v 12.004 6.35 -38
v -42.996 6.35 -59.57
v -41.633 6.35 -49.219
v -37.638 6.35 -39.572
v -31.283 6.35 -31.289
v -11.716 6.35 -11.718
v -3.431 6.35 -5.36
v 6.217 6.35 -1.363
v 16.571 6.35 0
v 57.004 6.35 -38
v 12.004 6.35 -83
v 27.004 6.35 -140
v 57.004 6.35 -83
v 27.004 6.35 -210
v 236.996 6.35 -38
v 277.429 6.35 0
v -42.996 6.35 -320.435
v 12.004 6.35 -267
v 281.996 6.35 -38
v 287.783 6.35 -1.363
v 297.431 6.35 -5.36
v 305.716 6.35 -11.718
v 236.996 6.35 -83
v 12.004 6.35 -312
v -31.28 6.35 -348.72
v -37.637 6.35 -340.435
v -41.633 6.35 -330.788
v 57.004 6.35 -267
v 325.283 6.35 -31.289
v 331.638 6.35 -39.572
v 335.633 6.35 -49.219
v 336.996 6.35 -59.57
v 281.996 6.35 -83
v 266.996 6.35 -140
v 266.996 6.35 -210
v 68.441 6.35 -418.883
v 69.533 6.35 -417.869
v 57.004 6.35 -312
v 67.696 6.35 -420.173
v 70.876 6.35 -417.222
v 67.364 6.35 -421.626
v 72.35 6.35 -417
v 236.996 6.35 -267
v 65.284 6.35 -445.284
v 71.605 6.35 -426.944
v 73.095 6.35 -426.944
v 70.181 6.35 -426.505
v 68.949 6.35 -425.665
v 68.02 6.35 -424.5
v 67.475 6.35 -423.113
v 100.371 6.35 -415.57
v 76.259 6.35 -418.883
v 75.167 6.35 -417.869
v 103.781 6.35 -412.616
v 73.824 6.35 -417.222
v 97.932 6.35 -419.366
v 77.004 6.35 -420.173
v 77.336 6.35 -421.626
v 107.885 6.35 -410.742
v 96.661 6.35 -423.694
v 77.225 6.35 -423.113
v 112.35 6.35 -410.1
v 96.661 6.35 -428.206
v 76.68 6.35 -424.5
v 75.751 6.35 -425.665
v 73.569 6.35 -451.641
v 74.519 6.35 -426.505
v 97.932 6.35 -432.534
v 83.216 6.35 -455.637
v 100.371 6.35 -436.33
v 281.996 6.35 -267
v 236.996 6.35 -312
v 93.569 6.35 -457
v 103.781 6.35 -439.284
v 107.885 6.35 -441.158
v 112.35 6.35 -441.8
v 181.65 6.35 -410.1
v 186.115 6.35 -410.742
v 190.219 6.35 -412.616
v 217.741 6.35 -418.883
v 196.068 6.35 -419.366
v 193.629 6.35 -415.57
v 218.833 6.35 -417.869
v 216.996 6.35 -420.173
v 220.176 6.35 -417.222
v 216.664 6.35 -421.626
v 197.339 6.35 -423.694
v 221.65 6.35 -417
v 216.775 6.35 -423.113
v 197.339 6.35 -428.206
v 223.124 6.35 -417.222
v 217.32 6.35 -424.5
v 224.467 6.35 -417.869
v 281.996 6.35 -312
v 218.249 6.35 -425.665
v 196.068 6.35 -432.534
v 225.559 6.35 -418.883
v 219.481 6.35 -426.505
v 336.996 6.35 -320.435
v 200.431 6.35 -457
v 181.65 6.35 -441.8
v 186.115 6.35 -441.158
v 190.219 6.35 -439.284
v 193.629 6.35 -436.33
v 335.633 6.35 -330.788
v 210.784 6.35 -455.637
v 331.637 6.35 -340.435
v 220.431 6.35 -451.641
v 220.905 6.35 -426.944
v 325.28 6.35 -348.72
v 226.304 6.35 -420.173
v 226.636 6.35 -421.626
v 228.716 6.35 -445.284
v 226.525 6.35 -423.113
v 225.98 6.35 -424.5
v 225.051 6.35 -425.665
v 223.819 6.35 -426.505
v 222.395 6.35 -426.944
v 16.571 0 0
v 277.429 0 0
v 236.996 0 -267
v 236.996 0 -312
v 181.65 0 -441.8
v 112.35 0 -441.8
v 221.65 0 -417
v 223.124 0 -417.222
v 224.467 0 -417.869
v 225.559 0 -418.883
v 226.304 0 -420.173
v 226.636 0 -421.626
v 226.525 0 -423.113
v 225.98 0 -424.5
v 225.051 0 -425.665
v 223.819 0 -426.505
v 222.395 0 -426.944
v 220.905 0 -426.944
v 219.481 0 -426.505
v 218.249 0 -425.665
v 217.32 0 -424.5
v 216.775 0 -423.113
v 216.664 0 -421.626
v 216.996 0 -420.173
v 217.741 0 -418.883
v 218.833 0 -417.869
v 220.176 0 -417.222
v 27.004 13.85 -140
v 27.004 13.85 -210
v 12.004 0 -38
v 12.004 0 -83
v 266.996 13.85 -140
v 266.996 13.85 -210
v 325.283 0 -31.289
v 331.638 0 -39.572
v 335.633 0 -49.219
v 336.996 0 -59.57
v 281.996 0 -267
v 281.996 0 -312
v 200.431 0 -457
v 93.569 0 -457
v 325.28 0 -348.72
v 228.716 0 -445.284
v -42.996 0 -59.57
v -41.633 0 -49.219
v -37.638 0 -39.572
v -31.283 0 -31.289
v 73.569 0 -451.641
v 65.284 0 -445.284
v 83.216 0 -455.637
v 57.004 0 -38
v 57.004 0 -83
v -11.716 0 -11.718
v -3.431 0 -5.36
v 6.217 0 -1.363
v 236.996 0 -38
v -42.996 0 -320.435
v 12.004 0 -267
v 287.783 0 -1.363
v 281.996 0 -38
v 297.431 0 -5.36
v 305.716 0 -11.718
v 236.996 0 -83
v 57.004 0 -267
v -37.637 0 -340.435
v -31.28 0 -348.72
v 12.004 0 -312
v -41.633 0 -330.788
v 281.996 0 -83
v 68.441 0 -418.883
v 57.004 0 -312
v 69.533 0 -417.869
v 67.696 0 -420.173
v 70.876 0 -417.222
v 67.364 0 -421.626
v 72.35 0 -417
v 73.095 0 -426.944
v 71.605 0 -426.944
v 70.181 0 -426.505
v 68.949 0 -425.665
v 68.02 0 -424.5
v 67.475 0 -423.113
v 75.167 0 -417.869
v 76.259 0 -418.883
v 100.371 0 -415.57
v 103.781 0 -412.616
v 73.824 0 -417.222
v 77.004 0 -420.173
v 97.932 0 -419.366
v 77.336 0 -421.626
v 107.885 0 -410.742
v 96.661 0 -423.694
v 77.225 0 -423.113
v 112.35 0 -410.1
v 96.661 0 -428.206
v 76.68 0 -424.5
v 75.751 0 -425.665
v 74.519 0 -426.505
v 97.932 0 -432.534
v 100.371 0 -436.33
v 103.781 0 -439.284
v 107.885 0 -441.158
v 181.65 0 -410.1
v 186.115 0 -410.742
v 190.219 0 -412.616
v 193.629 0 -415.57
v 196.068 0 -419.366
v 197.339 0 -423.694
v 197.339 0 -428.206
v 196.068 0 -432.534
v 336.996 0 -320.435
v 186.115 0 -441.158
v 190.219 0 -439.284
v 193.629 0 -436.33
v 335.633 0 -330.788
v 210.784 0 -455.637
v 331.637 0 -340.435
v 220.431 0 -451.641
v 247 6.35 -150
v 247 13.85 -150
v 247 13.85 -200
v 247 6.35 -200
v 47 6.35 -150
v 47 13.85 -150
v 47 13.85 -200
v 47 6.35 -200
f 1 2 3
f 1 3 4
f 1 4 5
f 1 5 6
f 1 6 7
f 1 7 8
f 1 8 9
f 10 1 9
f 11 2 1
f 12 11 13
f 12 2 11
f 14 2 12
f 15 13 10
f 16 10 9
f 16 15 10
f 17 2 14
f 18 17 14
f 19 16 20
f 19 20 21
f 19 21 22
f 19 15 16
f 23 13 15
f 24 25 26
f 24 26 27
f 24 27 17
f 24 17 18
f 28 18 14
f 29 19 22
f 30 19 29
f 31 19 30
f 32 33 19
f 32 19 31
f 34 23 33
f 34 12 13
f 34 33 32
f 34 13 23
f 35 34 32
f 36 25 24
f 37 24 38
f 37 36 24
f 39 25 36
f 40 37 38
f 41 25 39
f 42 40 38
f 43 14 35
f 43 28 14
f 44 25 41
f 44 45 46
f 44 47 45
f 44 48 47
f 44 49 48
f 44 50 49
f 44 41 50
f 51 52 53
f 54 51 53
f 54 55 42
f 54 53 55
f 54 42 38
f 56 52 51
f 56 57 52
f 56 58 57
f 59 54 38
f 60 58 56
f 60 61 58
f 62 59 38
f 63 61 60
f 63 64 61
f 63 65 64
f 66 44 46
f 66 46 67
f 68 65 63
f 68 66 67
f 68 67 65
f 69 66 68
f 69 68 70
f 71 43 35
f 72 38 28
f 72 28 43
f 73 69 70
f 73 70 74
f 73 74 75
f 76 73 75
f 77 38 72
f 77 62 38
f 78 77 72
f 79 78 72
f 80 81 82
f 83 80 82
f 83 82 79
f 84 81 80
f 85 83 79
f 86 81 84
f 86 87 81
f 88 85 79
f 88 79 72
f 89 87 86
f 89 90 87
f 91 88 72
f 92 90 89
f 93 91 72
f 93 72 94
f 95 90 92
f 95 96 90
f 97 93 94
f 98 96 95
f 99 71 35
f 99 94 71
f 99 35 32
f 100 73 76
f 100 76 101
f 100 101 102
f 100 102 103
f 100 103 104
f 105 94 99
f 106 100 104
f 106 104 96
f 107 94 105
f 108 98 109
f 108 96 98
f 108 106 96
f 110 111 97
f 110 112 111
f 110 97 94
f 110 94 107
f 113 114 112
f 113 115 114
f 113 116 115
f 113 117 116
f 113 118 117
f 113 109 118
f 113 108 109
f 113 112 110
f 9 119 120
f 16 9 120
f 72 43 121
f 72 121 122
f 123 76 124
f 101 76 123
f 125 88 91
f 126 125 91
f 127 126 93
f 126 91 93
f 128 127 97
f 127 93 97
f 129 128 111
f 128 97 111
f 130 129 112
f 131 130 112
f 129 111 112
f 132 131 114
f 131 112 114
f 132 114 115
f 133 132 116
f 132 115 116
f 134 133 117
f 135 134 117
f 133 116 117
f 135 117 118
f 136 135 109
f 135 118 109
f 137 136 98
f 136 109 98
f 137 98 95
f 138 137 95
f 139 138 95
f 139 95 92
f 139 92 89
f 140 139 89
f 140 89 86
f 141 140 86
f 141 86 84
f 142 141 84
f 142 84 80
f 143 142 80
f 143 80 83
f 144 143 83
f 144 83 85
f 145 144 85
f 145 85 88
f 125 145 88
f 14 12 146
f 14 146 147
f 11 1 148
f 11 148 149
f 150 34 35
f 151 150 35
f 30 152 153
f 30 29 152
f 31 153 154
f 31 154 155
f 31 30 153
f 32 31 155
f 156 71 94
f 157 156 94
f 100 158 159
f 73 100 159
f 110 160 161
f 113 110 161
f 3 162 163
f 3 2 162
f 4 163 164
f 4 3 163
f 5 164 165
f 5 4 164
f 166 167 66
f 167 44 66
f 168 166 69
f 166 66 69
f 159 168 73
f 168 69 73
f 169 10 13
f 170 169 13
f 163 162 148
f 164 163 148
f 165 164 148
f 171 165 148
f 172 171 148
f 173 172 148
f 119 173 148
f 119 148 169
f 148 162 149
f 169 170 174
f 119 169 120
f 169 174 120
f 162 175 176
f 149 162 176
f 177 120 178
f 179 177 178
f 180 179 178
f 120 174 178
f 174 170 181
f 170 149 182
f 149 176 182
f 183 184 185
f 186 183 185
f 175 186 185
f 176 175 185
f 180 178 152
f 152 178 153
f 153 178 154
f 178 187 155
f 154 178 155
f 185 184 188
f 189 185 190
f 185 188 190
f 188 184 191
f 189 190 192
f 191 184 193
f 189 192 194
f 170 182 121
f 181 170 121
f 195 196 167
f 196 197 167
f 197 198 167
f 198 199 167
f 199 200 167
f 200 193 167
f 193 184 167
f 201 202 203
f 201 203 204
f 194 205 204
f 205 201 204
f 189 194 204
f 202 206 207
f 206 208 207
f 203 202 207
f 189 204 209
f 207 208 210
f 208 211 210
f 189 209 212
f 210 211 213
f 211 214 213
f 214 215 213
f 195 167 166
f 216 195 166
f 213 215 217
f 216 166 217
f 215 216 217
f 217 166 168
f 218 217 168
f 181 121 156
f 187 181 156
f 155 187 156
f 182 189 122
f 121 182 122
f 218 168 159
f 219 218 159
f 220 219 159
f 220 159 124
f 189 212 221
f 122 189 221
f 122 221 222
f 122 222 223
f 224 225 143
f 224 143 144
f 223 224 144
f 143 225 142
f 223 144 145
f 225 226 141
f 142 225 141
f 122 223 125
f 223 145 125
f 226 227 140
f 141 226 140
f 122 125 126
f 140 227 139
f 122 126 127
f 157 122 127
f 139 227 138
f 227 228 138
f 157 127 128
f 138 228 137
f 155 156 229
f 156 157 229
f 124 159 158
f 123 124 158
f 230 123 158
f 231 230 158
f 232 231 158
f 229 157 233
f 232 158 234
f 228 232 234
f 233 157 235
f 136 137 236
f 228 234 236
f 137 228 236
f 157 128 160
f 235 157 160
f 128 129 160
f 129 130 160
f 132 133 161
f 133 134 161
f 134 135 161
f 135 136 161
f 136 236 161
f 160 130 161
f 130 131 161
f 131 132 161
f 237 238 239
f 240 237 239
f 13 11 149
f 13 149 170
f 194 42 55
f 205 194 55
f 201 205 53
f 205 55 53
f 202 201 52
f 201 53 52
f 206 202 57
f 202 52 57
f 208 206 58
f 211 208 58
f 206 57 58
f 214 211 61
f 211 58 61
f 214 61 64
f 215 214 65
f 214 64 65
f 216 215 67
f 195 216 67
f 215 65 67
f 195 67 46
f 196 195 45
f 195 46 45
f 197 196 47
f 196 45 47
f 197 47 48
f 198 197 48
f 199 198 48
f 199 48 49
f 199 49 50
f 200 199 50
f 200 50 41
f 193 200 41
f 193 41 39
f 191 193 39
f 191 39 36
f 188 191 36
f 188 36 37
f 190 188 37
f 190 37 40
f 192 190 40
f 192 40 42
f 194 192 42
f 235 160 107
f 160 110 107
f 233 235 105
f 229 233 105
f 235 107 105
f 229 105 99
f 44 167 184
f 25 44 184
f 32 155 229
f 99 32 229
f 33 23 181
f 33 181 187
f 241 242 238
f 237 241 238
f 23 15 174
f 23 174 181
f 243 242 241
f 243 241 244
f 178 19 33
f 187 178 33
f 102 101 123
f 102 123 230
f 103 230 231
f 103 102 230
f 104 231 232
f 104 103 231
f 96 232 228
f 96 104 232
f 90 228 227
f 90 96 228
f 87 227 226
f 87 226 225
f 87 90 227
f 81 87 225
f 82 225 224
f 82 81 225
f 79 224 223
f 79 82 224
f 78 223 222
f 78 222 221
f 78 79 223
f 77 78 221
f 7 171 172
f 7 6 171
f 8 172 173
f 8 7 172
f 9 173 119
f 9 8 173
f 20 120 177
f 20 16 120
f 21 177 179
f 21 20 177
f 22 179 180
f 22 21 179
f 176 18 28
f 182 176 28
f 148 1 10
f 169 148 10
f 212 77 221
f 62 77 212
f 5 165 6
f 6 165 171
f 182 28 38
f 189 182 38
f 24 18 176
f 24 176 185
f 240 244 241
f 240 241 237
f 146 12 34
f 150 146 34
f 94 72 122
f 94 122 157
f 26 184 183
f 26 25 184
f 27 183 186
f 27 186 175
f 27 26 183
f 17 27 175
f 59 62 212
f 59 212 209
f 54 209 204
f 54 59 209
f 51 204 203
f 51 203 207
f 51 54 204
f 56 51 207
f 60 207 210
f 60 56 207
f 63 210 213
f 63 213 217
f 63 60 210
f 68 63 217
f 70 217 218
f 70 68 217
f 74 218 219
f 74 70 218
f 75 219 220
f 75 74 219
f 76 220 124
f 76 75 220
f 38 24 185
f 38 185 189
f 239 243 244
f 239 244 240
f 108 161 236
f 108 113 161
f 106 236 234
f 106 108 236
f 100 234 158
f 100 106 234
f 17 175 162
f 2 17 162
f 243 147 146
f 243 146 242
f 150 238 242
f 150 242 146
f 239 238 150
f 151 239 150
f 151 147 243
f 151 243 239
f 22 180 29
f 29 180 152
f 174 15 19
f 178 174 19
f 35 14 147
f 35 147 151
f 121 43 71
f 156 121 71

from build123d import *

# Parameters (mm, degrees)
BODY_DEPTH                         = 6.35
HANDLE_DEPTH                       = 6.35
SKETCH3_R                          = 10
BEARING_RINGS_DEPTH                = 3.175
SKETCH7_W                          = 239.992041534
SKETCH7_H                          = 70
OUTSIDE_PERIMETER_CONSTRAINT_DEPTH = 7.5
SKETCH10_W                         = 200
SKETCH10_H                         = 50
INSIDE_PERIMETER_CONSTRAINT_DEPTH  = 7.5
SKETCH11_R                         = 5
LOCKING_MECHANISM_HOLES_DEPTH      = 6.36
SKETCH12_W                         = 45
SKETCH12_H                         = 45
SQUARE_BEARING_CUT_DEPTH           = 6.35
FILLET1_R                          = 40
FILLET2_R                          = 40


with BuildPart() as part:
    # Sketch1 → Body (new body)
    with BuildSketch(Plane(origin=(0, 0, 0), x_dir=(1, 0, 0), z_dir=(0, 1, 0))):
        Polygon((0, 0), (294, 0), (336.996020767, 43.003978862), (336.996020767, 337.003978862), (217, 456.999999629), (77, 456.999999629), (-42.996020767, 337.003978862), (-42.996020767, 43.003978862), align=None)
    extrude(amount=BODY_DEPTH)

    # Sketch2 → Handle (cut)
    with BuildSketch(Plane(origin=(0, 6.35, 0), x_dir=(1, 0, 0), z_dir=(0, 1, 0))):
        with BuildLine():
            Line((112.35, 441.799999629), (181.65, 441.799999629))
            ThreePointArc((181.65, 441.799999629), (197.5, 425.949999629), (181.65, 410.099999629))
            Line((181.65, 410.099999629), (112.35, 410.099999629))
            ThreePointArc((112.35, 410.099999629), (96.5, 425.949999629), (112.35, 441.799999629))
        make_face()
    extrude(amount=-HANDLE_DEPTH, mode=Mode.SUBTRACT)

    # Sketch3 → Bearing Rings (cut)
    with BuildSketch(Plane(origin=(0, 6.35, 0), x_dir=(1, 0, 0), z_dir=(0, 1, 0))):
        with Locations(Location((27.003979233, 300, 0), (0, 0, 270))):
            Circle(SKETCH3_R)
        with Locations(Location((266.996020767, 300, 0), (0, 0, 270))):
            Circle(SKETCH3_R)
        with Locations(Location((266.996020767, 50, 0), (0, 0, 270))):
            Circle(SKETCH3_R)
        with Locations(Location((27.003979233, 50, 0), (0, 0, 270))):
            Circle(SKETCH3_R)
    extrude(amount=-BEARING_RINGS_DEPTH, mode=Mode.SUBTRACT)

    # Sketch7 → Outside Perimeter Constraint (add)
    with BuildSketch(Plane(origin=(0, 6.35, 0), x_dir=(1, 0, 0), z_dir=(0, 1, 0))):
        with Locations((147, 175)):
            Rectangle(SKETCH7_W, SKETCH7_H)
    extrude(amount=OUTSIDE_PERIMETER_CONSTRAINT_DEPTH)

    # Sketch10 → Inside Perimeter Constraint (cut)
    with BuildSketch(Plane(origin=(0, 13.85, 0), x_dir=(1, 0, 0), z_dir=(0, 1, 0))):
        with Locations((147, 175)):
            Rectangle(SKETCH10_W, SKETCH10_H)
    extrude(amount=-INSIDE_PERIMETER_CONSTRAINT_DEPTH, mode=Mode.SUBTRACT)

    # Sketch11 → Locking Mechanism Holes (cut)
    with BuildSketch(Plane(origin=(0, 6.35, 0), x_dir=(1, 0, 0), z_dir=(0, 1, 0))):
        with Locations(Location((221.65, 421.999999629, 0), (0, 0, 270))):
            Circle(SKETCH11_R)
        with Locations(Location((72.35, 421.999999629, 0), (0, 0, 270))):
            Circle(SKETCH11_R)
    extrude(amount=-LOCKING_MECHANISM_HOLES_DEPTH, mode=Mode.SUBTRACT)

    # Sketch12 → Square Bearing Cut (cut)
    with BuildSketch(Plane(origin=(0, 6.35, 0), x_dir=(1, 0, 0), z_dir=(0, 1, 0))):
        with Locations((34.503979233, 289.499999629)):
            Rectangle(SKETCH12_W, SKETCH12_H)
        with Locations((259.496020767, 289.499999629)):
            Rectangle(SKETCH12_W, SKETCH12_H)
        with Locations((259.496020767, 60.500000371)):
            Rectangle(SKETCH12_W, SKETCH12_H)
        with Locations((34.503979233, 60.500000371)):
            Rectangle(SKETCH12_W, SKETCH12_H)
    extrude(amount=-SQUARE_BEARING_CUT_DEPTH, mode=Mode.SUBTRACT)

    # Fillet1
    fillet1_edges = [part.edges().sort_by_distance(p)[0] for p in [
        (77, 3.175, -456.999999629),
        (217, 3.175, -456.999999629),
    ]]
    fillet(fillet1_edges, radius=FILLET1_R)

    # Fillet2
    fillet2_edges = [part.edges().sort_by_distance(p)[0] for p in [
        (-42.996020767, 3.175, -43.003978862),
        (-42.996020767, 3.175, -337.003978862),
        (336.996020767, 3.175, -337.003978862),
        (336.996020767, 3.175, -43.003978862),
        (294, 3.175, 0),
        (0, 3.175, 0),
    ]]
    fillet(fillet2_edges, radius=FILLET2_R)


solid = part.part
